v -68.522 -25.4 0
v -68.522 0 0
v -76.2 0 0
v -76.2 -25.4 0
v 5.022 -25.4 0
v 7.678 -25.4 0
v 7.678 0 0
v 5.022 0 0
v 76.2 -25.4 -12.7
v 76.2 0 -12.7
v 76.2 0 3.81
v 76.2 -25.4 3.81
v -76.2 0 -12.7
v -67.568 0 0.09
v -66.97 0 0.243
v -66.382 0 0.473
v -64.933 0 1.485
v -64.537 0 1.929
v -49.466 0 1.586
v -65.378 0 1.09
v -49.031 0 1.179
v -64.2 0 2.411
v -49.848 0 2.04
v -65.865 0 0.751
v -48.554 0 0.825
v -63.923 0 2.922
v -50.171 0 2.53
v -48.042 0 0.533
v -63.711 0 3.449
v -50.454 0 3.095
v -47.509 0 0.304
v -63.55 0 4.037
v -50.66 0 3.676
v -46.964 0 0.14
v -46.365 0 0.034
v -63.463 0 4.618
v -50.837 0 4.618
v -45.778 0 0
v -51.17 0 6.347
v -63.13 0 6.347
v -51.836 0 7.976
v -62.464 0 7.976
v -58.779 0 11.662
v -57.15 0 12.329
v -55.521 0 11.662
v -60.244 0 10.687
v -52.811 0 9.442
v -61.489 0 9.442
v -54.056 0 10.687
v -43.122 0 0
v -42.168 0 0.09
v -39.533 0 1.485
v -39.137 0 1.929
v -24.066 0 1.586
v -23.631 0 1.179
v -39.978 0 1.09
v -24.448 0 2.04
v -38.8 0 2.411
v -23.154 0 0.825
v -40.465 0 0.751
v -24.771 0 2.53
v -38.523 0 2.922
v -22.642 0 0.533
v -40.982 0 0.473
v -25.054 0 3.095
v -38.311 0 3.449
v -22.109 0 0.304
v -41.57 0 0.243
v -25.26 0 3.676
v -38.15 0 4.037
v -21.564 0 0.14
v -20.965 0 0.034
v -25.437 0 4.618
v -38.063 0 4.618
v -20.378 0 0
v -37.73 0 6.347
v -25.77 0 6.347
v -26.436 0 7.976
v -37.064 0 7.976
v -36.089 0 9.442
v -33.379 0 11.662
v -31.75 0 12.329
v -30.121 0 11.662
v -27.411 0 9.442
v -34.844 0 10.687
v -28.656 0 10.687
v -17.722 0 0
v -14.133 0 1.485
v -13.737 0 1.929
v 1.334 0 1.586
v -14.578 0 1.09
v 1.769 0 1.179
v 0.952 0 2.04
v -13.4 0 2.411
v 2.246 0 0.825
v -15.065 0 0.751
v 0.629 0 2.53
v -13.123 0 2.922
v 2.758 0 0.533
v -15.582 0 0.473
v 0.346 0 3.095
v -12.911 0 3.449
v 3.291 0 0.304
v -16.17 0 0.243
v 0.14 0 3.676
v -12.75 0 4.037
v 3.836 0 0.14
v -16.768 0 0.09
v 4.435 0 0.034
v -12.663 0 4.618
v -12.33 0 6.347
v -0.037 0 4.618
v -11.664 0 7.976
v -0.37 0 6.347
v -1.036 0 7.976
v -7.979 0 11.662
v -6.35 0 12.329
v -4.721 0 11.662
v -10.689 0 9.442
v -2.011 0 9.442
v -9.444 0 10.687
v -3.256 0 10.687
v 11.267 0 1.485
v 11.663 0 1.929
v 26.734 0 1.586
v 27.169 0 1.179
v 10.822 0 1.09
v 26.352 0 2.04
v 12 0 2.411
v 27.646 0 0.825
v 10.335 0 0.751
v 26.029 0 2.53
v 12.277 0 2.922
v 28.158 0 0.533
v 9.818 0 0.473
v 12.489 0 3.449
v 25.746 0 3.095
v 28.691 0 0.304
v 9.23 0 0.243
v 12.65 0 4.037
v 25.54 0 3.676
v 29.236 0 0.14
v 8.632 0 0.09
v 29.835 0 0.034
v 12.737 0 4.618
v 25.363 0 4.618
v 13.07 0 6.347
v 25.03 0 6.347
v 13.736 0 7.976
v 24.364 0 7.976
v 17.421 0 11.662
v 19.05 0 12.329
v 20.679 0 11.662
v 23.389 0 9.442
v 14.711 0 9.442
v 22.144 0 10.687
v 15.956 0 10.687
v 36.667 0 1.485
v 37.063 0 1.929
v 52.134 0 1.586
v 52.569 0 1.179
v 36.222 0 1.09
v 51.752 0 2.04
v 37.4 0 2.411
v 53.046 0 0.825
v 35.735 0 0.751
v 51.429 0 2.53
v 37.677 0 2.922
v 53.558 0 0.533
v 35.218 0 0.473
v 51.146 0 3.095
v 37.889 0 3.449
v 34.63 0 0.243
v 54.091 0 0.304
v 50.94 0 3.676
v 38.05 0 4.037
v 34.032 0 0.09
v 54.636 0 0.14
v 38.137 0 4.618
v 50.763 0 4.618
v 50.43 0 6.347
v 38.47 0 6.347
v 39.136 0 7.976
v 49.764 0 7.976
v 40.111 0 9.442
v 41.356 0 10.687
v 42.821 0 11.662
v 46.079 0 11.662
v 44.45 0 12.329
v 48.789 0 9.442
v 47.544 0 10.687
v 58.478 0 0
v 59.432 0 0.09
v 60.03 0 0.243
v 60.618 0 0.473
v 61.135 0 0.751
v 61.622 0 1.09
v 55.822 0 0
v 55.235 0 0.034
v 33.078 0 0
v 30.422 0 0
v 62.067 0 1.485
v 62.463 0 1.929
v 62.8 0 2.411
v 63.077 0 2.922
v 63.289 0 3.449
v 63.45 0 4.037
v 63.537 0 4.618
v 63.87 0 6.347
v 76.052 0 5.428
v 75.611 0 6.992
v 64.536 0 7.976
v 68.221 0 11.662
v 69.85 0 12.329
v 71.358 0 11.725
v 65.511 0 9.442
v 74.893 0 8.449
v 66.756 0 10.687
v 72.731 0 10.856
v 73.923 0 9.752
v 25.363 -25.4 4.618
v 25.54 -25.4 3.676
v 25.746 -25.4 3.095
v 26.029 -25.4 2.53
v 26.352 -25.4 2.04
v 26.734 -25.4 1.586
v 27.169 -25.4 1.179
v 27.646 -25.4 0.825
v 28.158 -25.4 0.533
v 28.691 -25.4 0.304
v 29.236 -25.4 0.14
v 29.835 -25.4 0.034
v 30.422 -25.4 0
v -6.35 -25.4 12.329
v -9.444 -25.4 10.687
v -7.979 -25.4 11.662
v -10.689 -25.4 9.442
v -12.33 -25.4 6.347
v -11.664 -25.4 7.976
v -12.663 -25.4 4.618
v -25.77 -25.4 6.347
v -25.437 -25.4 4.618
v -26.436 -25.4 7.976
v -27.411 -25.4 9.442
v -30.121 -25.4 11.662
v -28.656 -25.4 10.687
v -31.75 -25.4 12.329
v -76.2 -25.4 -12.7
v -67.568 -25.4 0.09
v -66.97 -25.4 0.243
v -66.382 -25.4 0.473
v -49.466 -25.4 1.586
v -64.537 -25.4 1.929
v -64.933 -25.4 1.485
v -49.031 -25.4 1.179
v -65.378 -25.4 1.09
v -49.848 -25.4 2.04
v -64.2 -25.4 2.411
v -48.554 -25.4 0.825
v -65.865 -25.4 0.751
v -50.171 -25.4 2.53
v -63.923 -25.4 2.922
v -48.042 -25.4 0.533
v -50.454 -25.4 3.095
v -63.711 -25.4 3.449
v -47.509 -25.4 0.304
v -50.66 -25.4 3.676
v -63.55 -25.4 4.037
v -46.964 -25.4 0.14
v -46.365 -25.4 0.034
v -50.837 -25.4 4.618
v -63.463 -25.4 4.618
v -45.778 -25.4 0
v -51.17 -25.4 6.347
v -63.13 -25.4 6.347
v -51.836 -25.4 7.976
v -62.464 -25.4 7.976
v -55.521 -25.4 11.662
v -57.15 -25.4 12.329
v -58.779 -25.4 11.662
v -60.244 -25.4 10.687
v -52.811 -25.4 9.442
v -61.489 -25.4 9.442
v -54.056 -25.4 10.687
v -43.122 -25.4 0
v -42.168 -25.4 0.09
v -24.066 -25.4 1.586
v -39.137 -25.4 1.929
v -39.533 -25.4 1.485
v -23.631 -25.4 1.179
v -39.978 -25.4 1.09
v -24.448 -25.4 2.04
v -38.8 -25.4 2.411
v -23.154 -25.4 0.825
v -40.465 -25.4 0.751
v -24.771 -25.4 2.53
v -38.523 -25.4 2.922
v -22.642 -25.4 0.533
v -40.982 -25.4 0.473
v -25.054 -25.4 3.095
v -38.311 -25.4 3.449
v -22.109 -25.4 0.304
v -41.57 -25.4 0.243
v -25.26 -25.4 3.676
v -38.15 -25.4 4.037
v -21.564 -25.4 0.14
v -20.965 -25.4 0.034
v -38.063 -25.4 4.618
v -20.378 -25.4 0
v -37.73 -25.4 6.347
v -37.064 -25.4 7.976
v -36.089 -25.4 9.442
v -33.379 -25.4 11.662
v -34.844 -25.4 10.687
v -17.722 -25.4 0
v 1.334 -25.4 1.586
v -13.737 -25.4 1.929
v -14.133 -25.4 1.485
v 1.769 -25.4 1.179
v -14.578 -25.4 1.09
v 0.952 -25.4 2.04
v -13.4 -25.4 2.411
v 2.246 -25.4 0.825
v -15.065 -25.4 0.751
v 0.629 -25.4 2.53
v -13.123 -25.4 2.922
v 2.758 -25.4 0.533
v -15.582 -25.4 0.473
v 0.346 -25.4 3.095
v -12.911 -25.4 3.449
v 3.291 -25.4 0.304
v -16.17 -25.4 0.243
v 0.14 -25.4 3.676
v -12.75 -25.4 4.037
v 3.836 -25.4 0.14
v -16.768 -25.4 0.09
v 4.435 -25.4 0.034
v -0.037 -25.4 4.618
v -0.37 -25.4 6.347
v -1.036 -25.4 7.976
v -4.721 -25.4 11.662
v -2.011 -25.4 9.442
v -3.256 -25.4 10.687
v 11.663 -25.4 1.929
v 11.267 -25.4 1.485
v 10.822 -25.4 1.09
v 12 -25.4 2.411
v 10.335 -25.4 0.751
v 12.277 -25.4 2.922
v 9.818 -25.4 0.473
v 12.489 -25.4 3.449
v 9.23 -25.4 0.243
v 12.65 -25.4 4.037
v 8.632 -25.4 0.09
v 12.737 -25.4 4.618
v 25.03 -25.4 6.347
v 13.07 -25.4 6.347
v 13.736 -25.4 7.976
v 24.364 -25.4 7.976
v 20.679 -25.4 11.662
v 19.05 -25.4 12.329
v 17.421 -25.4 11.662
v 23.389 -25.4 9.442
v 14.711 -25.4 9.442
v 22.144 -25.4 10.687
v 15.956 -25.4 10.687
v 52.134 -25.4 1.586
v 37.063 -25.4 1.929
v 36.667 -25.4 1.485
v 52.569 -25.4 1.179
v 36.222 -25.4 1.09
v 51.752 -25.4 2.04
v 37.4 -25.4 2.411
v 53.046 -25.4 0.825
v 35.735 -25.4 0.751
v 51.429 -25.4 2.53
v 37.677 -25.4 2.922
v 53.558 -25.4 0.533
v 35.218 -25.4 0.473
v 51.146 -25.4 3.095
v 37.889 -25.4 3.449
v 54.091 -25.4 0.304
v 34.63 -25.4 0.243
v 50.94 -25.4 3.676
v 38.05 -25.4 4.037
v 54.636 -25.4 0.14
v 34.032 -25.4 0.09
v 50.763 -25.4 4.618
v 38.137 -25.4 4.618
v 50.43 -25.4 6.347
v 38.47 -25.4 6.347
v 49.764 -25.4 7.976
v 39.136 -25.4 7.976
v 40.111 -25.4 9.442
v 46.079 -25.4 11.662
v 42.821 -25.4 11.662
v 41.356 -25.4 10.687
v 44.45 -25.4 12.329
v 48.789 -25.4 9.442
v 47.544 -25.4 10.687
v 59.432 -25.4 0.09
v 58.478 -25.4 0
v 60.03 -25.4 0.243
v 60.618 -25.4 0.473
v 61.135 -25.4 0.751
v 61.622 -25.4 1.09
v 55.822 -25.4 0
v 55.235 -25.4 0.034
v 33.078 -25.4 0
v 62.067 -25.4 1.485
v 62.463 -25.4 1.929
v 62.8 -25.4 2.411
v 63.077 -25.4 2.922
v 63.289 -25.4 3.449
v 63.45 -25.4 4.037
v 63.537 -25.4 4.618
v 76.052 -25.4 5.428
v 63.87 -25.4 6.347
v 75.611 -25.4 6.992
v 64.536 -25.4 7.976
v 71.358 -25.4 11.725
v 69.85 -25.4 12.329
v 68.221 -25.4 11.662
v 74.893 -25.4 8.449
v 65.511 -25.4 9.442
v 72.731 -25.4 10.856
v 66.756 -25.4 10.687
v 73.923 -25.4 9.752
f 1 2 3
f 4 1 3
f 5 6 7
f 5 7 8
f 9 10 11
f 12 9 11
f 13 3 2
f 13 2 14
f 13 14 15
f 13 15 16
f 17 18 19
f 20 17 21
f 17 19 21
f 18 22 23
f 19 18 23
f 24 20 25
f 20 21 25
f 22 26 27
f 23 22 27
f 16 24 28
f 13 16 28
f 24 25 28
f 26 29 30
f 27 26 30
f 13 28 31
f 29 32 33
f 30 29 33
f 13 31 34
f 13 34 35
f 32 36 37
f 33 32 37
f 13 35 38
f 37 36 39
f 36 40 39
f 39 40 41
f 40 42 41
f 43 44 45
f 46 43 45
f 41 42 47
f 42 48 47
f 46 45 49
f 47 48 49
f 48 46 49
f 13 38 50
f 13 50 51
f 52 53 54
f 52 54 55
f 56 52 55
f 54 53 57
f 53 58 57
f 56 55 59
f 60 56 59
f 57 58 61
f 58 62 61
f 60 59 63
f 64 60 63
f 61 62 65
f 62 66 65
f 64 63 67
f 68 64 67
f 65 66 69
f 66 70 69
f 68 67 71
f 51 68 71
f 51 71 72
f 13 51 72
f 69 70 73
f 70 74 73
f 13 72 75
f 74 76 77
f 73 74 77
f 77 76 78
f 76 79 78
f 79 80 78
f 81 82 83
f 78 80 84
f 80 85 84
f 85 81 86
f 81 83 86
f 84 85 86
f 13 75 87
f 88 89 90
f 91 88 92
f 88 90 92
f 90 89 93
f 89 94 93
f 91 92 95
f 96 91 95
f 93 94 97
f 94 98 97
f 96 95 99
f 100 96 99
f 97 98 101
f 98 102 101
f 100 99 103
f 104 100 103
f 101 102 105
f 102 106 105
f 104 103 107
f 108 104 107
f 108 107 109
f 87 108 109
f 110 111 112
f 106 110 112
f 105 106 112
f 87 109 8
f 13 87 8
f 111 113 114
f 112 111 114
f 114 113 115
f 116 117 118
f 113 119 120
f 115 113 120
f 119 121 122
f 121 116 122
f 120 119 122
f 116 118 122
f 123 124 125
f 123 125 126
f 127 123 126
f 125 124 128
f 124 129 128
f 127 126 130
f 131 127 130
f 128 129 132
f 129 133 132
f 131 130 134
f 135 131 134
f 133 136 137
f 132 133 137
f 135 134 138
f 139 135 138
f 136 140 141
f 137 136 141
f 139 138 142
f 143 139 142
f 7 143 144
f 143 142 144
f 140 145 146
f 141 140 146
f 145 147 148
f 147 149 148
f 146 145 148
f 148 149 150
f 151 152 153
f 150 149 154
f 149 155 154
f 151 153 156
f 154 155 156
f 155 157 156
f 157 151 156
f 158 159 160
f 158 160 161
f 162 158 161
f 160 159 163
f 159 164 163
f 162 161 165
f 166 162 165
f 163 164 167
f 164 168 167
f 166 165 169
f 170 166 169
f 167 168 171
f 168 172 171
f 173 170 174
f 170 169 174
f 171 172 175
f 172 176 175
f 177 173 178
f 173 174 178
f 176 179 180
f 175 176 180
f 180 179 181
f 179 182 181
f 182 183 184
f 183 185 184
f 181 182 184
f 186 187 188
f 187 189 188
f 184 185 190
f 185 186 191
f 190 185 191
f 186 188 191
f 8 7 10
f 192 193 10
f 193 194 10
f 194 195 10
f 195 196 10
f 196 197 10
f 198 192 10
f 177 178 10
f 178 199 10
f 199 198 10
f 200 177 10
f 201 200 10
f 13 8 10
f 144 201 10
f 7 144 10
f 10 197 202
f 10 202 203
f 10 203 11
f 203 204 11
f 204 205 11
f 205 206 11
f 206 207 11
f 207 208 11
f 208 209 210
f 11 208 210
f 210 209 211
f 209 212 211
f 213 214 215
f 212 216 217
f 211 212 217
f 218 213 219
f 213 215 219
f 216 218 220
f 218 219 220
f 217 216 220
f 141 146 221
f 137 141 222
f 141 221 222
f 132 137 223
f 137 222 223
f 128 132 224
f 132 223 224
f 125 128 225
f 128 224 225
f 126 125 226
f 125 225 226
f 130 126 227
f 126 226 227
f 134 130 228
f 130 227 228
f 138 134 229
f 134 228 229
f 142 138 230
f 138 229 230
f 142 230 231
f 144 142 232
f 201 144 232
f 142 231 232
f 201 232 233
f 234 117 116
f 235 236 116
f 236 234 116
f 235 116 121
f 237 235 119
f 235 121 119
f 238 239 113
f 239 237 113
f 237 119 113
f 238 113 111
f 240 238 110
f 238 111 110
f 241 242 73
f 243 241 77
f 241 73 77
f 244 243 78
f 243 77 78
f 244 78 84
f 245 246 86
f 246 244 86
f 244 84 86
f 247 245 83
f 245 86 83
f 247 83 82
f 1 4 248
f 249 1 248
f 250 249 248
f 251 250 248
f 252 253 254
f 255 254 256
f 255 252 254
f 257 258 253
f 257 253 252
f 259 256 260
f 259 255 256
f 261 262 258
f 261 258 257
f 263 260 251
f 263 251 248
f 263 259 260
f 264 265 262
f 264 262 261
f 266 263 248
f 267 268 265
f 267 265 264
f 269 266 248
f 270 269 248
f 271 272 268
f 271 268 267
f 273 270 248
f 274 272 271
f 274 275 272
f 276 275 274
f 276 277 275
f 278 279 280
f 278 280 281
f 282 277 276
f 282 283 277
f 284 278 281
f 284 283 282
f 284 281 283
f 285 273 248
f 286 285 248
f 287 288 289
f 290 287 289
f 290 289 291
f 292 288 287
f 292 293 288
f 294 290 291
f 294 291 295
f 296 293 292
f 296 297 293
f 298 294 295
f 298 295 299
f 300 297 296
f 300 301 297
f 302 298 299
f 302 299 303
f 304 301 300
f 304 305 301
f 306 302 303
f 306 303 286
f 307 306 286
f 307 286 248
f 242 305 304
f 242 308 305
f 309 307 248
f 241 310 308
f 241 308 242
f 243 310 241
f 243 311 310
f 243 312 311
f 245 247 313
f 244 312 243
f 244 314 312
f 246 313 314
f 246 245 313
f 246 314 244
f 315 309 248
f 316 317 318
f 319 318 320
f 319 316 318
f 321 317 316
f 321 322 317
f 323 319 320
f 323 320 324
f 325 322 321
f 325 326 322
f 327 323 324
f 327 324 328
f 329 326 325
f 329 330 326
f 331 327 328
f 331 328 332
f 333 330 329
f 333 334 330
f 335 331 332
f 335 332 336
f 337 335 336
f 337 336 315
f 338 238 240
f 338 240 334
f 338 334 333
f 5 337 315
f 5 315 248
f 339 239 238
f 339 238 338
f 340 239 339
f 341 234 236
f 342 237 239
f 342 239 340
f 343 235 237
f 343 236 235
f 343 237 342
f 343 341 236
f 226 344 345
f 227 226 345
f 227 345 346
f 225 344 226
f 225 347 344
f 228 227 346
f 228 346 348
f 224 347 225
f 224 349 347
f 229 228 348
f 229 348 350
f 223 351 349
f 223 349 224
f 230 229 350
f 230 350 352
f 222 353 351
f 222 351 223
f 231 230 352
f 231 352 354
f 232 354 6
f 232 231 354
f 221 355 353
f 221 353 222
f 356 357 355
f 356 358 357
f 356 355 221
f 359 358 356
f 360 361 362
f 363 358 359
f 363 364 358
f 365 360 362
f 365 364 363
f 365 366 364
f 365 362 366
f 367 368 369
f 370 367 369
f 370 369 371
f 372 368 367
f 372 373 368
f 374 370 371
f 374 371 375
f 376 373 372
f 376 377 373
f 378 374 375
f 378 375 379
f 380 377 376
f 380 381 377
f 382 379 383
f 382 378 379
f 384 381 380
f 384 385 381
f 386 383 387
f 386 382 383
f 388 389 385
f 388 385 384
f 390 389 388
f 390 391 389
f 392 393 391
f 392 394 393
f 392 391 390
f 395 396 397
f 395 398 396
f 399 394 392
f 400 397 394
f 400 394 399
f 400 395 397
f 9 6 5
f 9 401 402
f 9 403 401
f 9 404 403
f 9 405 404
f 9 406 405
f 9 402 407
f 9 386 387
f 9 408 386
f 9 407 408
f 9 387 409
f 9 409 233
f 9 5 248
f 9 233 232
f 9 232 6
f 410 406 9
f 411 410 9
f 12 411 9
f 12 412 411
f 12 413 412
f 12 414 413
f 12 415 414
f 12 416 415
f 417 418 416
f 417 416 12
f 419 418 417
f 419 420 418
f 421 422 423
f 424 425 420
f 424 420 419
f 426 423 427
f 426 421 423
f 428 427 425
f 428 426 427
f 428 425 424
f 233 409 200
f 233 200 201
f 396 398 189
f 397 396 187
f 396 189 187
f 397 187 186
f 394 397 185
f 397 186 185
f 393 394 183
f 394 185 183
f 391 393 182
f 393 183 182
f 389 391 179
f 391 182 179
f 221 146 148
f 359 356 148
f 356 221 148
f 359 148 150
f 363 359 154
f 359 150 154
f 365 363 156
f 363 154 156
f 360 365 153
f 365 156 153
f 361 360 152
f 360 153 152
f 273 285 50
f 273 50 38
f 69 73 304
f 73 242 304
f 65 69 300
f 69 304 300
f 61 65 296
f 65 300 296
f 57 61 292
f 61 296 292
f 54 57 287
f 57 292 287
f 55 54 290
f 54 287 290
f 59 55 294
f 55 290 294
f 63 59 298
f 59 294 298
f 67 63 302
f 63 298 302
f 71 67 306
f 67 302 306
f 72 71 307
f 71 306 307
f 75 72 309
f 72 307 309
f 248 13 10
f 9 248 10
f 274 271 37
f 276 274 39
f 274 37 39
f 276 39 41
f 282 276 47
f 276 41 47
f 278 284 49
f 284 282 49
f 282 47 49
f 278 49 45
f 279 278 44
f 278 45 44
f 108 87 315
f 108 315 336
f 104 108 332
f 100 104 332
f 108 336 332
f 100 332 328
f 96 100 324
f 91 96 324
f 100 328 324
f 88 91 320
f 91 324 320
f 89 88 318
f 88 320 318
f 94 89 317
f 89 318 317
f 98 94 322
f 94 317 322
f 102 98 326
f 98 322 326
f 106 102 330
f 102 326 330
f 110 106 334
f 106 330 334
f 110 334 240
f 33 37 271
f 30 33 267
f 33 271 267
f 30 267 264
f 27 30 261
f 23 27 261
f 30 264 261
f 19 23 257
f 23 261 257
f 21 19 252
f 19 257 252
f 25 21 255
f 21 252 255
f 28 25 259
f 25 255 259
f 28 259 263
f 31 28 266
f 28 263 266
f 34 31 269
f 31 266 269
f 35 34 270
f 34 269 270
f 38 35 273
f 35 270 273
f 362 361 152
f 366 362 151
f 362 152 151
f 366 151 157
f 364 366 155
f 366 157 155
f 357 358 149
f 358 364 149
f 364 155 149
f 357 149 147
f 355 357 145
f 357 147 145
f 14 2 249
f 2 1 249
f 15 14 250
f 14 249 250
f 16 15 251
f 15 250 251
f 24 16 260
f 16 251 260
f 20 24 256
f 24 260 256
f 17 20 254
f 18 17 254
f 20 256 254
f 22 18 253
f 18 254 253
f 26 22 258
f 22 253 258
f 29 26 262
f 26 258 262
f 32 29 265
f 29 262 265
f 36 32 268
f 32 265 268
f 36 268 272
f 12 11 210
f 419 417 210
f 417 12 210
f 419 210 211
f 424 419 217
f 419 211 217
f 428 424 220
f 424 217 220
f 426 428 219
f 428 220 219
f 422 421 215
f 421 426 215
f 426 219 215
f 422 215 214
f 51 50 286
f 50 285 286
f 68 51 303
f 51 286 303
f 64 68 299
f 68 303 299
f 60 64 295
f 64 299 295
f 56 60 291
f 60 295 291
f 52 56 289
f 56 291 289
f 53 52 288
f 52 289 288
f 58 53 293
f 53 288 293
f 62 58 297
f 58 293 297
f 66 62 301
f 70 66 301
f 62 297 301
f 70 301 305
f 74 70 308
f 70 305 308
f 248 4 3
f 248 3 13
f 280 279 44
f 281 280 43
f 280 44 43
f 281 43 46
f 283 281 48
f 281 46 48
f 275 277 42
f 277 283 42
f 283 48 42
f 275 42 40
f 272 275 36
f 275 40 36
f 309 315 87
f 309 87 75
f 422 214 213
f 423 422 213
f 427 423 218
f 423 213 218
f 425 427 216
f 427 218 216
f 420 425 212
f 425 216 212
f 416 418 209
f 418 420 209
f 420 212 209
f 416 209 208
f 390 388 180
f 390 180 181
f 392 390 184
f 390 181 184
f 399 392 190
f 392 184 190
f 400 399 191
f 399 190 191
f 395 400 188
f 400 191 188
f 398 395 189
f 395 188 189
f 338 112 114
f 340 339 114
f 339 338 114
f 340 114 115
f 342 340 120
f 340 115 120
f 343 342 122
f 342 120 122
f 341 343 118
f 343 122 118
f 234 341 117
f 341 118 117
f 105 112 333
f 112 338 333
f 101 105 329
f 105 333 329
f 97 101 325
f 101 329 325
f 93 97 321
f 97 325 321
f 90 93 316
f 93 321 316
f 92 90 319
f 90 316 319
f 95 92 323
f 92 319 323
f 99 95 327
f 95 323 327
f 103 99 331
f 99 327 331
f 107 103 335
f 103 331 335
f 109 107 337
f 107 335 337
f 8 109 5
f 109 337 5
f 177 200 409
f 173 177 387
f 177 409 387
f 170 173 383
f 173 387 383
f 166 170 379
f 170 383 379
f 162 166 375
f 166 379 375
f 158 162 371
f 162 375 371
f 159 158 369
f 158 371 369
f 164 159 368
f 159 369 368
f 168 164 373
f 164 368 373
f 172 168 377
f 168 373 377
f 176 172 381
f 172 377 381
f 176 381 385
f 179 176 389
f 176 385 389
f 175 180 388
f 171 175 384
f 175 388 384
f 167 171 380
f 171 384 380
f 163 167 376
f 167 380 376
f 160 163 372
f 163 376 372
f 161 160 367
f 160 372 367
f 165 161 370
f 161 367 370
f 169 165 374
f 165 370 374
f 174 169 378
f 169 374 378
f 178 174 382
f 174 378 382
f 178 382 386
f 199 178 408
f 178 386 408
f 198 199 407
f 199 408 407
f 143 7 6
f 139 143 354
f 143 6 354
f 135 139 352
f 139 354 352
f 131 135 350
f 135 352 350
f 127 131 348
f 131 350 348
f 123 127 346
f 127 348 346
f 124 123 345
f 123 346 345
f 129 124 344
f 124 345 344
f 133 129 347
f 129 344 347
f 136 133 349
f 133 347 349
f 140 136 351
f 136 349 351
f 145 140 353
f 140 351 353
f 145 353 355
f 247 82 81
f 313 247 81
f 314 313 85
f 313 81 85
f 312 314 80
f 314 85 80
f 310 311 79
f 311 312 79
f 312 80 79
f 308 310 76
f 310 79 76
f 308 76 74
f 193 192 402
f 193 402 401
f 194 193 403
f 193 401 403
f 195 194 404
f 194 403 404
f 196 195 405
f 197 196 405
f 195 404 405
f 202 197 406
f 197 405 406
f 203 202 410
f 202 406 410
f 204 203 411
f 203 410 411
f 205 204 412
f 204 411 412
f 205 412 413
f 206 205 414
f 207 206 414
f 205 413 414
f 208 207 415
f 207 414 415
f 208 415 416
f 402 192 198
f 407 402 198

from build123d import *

# Parameters (mm, degrees)
F0_W        = 12.7
F0_H        = 12.7
F1_DEPTH    = 25.4
F2_T1_DEPTH = 69.85
F3_R        = 5.08


# Not quite as in the source:
# - a fillet or chamfer that OpenCascade refuses, or shapes differently, is made with other operations: its cross-section is extruded or revolved along the edge and cut away or added


with BuildPart() as f1:
    # F0 (on Front) → F1 (new body)
    with BuildSketch(Plane.XZ):
        Polygon((12.7, 0), (0, 0), (-12.7, 0), (-25.4, 0), (-38.1, 0), (-50.8, 0), (-63.5, 0), (-76.2, 0), (-76.2, -12.7), (0, -12.7), (76.2, -12.7), (76.2, 0), (63.5, 0), (50.8, 0), (38.1, 0), (25.4, 0), align=None)
        with Locations((-6.35, 6.35)):
            Rectangle(F0_W, F0_H)
        with Locations((19.05, 6.35)):
            Rectangle(F0_W, F0_H)
        with Locations((-31.75, 6.35)):
            Rectangle(F0_W, F0_H)
        with Locations((44.45, 6.35)):
            Rectangle(F0_W, F0_H)
        with Locations((-57.15, 6.35)):
            Rectangle(F0_W, F0_H)
        with Locations((69.85, 6.35)):
            Rectangle(F0_W, F0_H)
    extrude(amount=F1_DEPTH)

    # F2: fillet of radius 8.89 on 12 edges, made by hand

    # F2_s2 → F2_t1 (cut)
    with BuildSketch(Plane.XZ.offset(-22.225)):
        with BuildLine():
            ThreePointArc((-54.61, 12.7), (-60.8961792847, 10.0961792847), (-63.5, 3.81))
            Line((-63.5, 3.81), (-63.5, 12.7))
            Line((-63.5, 12.7), (-54.61, 12.7))
        make_face()
        with BuildLine():
            ThreePointArc((-50.8, 3.81), (-53.4038207153, 10.0961792847), (-59.69, 12.7))
            Line((-59.69, 12.7), (-50.8, 12.7))
            Line((-50.8, 12.7), (-50.8, 3.81))
        make_face()
        with BuildLine():
            ThreePointArc((-29.21, 12.7), (-35.4961792847, 10.0961792847), (-38.1, 3.81))
            Line((-38.1, 3.81), (-38.1, 12.7))
            Line((-38.1, 12.7), (-29.21, 12.7))
        make_face()
        with BuildLine():
            ThreePointArc((-25.4, 3.81), (-28.0038207153, 10.0961792847), (-34.29, 12.7))
            Line((-34.29, 12.7), (-25.4, 12.7))
            Line((-25.4, 12.7), (-25.4, 3.81))
        make_face()
        with BuildLine():
            ThreePointArc((-3.81, 12.7), (-10.0961792847, 10.0961792847), (-12.7, 3.81))
            Line((-12.7, 3.81), (-12.7, 12.7))
            Line((-12.7, 12.7), (-3.81, 12.7))
        make_face()
        with BuildLine():
            ThreePointArc((0, 3.81), (-2.6038207153, 10.0961792847), (-8.89, 12.7))
            Line((-8.89, 12.7), (0, 12.7))
            Line((0, 12.7), (0, 3.81))
        make_face()
        with BuildLine():
            ThreePointArc((21.59, 12.7), (15.3038207153, 10.0961792847), (12.7, 3.81))
            Line((12.7, 3.81), (12.7, 12.7))
            Line((12.7, 12.7), (21.59, 12.7))
        make_face()
        with BuildLine():
            ThreePointArc((25.4, 3.81), (22.7961792847, 10.0961792847), (16.51, 12.7))
            Line((16.51, 12.7), (25.4, 12.7))
            Line((25.4, 12.7), (25.4, 3.81))
        make_face()
        with BuildLine():
            ThreePointArc((46.99, 12.7), (40.7038207153, 10.0961792847), (38.1, 3.81))
            Line((38.1, 3.81), (38.1, 12.7))
            Line((38.1, 12.7), (46.99, 12.7))
        make_face()
        with BuildLine():
            ThreePointArc((50.8, 3.81), (48.1961792847, 10.0961792847), (41.91, 12.7))
            Line((41.91, 12.7), (50.8, 12.7))
            Line((50.8, 12.7), (50.8, 3.81))
        make_face()
        with BuildLine():
            ThreePointArc((76.2, 3.81), (73.5961792847, 10.0961792847), (67.31, 12.7))
            Line((67.31, 12.7), (76.2, 12.7))
            Line((76.2, 12.7), (76.2, 3.81))
        make_face()
        with BuildLine():
            ThreePointArc((72.39, 12.7), (66.1038207153, 10.0961792847), (63.5, 3.81))
            Line((63.5, 3.81), (63.5, 12.7))
            Line((63.5, 12.7), (72.39, 12.7))
        make_face()
    extrude(amount=F2_T1_DEPTH, mode=Mode.SUBTRACT)

    # F3
    f3_edges = [f1.edges().sort_by_distance(p)[0] for p in [
        (-63.5, -12.7, 0),
        (-50.8, -12.7, 0),
        (-38.1, -12.7, 0),
        (-25.4, -12.7, 0),
        (-12.7, -12.7, 0),
        (0, -12.7, 0),
        (12.7, -12.7, 0),
        (38.1, -12.7, 0),
        (63.5, -12.7, 0),
        (50.8, -12.7, 0),
        (25.4, -12.7, 0),
    ]]
    fillet(f3_edges, radius=F3_R)


solid = f1.part
